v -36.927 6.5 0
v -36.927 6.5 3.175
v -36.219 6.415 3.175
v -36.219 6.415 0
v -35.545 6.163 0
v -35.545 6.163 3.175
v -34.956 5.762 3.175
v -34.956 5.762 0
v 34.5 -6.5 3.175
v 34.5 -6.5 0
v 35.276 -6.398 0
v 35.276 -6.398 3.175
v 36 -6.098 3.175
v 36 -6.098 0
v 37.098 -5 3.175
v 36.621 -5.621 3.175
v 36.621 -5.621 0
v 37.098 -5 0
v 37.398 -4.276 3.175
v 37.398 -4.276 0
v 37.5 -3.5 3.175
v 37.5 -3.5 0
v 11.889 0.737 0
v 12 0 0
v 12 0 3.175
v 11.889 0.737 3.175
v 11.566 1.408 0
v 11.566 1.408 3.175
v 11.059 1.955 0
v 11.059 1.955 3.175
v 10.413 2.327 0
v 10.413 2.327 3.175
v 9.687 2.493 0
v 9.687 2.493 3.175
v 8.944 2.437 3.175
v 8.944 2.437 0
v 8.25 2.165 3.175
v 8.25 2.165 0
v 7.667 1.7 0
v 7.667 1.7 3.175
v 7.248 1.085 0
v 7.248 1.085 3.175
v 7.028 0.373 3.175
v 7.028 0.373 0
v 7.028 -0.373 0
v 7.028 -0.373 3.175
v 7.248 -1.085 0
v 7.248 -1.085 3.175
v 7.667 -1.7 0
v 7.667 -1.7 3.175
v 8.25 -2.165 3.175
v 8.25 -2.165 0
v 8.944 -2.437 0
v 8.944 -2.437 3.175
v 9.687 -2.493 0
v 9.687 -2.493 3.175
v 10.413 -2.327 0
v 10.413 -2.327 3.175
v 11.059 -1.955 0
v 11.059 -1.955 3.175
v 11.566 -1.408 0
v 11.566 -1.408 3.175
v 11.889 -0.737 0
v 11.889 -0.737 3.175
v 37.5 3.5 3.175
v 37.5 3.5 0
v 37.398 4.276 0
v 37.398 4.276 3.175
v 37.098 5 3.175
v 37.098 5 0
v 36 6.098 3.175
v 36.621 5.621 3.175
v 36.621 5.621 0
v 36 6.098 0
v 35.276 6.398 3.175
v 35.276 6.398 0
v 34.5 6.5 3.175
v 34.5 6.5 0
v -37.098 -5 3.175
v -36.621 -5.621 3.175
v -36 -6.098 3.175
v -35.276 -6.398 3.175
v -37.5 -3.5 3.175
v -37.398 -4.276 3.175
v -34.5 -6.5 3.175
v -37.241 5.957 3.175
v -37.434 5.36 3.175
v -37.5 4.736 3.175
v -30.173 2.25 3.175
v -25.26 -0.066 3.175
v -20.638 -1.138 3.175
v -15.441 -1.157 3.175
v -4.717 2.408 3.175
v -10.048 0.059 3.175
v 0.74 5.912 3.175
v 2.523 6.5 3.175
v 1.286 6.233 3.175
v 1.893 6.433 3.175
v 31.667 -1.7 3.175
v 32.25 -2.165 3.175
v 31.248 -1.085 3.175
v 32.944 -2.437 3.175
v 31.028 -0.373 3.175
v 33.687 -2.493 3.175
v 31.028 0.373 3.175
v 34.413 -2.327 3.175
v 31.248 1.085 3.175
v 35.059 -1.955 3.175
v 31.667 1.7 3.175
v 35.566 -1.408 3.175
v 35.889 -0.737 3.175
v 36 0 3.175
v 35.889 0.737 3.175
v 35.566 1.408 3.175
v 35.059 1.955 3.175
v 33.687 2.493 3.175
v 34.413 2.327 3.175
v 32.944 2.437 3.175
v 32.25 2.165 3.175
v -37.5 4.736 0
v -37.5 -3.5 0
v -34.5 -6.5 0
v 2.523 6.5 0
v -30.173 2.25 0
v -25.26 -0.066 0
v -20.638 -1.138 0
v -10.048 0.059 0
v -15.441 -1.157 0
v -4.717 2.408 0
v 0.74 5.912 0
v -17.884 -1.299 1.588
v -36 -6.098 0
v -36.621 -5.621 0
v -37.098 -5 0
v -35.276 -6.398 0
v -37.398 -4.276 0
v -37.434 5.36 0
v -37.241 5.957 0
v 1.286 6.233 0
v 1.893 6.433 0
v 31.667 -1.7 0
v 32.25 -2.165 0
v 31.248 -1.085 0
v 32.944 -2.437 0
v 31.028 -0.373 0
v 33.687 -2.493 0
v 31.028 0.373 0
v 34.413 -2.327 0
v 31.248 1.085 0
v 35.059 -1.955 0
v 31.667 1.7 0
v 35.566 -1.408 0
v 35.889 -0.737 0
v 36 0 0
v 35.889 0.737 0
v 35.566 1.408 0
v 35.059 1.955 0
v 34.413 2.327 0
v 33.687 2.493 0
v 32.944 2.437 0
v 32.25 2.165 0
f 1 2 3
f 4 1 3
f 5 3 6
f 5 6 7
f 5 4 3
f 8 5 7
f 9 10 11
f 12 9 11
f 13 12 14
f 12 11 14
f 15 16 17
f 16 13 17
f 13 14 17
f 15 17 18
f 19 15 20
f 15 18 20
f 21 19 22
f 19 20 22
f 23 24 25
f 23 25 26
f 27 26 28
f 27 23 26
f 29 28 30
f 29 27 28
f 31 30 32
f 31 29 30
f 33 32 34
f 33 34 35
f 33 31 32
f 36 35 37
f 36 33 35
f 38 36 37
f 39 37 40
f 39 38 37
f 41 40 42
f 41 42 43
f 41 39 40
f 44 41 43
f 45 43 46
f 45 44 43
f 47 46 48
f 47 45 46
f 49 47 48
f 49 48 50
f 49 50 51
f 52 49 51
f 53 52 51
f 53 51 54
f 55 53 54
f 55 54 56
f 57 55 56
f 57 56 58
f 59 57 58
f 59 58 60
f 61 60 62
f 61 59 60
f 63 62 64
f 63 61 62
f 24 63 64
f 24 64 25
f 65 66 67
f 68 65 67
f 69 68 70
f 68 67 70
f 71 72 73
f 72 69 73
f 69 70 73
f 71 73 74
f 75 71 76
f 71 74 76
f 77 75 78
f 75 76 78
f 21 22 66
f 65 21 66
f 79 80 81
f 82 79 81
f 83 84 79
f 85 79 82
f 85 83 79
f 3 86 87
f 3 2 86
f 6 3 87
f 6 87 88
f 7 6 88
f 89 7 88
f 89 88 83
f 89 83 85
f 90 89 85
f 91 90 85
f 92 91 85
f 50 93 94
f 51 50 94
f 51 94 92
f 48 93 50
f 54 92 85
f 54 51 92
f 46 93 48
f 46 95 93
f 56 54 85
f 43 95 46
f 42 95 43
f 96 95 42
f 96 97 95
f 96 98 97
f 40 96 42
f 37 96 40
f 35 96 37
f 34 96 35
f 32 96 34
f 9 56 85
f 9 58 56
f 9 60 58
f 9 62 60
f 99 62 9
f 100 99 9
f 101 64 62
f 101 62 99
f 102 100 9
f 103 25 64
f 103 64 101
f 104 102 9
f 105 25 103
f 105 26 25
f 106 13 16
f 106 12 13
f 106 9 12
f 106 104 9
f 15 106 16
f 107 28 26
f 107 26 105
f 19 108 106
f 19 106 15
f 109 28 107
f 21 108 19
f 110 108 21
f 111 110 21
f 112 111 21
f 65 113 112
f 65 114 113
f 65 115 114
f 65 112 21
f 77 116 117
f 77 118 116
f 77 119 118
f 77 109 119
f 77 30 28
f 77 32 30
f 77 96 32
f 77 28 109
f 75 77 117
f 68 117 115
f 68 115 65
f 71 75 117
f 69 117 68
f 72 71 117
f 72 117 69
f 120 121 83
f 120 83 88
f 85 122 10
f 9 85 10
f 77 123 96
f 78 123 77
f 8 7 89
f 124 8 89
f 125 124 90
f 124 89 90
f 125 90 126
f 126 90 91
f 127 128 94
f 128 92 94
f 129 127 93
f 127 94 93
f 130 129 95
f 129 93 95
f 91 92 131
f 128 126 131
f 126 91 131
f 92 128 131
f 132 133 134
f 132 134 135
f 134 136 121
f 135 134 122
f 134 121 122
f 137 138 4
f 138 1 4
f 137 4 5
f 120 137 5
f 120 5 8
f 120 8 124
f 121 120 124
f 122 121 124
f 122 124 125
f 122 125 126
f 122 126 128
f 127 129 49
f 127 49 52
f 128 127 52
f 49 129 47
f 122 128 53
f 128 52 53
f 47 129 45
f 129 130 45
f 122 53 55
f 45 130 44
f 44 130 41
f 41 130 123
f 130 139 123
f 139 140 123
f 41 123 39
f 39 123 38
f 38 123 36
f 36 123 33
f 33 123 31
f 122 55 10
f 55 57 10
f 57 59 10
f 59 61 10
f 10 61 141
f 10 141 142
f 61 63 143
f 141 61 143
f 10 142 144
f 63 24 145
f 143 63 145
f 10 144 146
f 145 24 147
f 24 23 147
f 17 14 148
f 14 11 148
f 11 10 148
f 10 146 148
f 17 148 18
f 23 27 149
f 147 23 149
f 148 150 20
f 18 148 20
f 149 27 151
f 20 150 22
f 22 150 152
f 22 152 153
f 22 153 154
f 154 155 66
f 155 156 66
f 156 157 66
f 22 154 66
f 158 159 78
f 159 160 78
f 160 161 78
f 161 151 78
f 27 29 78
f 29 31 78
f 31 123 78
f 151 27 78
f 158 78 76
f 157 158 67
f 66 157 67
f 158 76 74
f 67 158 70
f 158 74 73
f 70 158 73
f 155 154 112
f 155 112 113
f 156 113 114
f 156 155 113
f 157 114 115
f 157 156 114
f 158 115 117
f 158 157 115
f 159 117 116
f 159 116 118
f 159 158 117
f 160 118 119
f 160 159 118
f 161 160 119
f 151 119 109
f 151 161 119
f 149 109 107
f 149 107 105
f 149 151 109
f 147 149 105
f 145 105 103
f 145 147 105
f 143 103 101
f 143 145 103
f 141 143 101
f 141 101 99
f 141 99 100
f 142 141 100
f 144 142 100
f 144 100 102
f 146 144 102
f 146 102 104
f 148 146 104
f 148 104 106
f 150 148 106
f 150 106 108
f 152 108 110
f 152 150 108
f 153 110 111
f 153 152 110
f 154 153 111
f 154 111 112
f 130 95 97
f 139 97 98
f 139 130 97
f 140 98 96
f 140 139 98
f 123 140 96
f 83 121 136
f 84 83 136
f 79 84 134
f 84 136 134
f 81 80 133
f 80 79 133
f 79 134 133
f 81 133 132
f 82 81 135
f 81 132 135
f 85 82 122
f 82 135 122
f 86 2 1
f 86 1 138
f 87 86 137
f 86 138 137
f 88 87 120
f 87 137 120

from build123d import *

# Parameters (mm, degrees)
SKETCH1_W           = 75
SKETCH1_H           = 13
SKETCH1_R           = 2.5
BOSS_EXTRUDE1_DEPTH = 3.175
CUT_EXTRUDE1_DEPTH  = 3.175
FILLET2_R           = 3
FILLET3_R           = 3


with BuildPart() as part:
    # Sketch1 → Boss-Extrude1 (new body)
    with BuildSketch(Plane.XY):
        Rectangle(SKETCH1_W, SKETCH1_H)
        with Locations((33.5, 0)):
            Circle(SKETCH1_R, mode=Mode.SUBTRACT)
        with Locations((9.5, 0)):
            Circle(SKETCH1_R, mode=Mode.SUBTRACT)
    extrude(amount=BOSS_EXTRUDE1_DEPTH)

    # Sketch3 → Cut-Extrude1 (cut)
    with BuildSketch(Plane.XY.offset(3.175)):
        with BuildLine():
            Line((-35.780363842, 6.5), (1.520225121, 6.5))
            add(Edge.make_bspline(
                [(-35.780363842, 6.5), (-18.824487267, -9.098123968), (1.520225121, 6.5)],
                knots=[0, 0, 0, 1, 1, 1], degree=2))
        make_face()
    extrude(amount=-CUT_EXTRUDE1_DEPTH, mode=Mode.SUBTRACT)

    # Fillet2
    fillet2_edges = [part.edges().sort_by_distance(p)[0] for p in [
        (-35.780363842, 6.5, 1.5875),
        (1.520225121, 6.5, 1.5875),
    ]]
    fillet(fillet2_edges, radius=FILLET2_R)

    # Fillet3
    # the kernel refuses this fillet: 3 mm, written as the material it takes off along each edge
    with BuildSketch(Plane(origin=(37.5, -6.5, -7.5), x_dir=(-1, 0, 0), z_dir=(0, 0, 1)), Plane(origin=(-37.5, -6.5, -7.5), x_dir=(0, 1, 0), z_dir=(0, 0, 1)), Plane(origin=(37.5, 6.5, -7.5), x_dir=(0, -1, 0), z_dir=(0, 0, 1))) as fillet3_piece_1:
        with BuildLine():
            CenterArc((FILLET3_R, -FILLET3_R), FILLET3_R, 90, 90)
            Line((0, -FILLET3_R), (-FILLET3_R * 0.02, -FILLET3_R))
            Line((-FILLET3_R * 0.02, -FILLET3_R), (-FILLET3_R * 0.02, FILLET3_R * 0.02))
            Line((-FILLET3_R * 0.02, FILLET3_R * 0.02), (FILLET3_R, FILLET3_R * 0.02))
            Line((FILLET3_R, FILLET3_R * 0.02), (FILLET3_R, 0))
        make_face()
    extrude(amount=18.175, mode=Mode.SUBTRACT)
    with BuildSketch(Plane(origin=(-37.5, 6.5, -4.409176768), x_dir=(1, 0, 0), z_dir=(0, 0, 1))) as fillet3_piece_2:
        with BuildLine():
            CenterArc((3, -1.763670707), FILLET3_R, 143.992564568, 36.007435432)
            Line((0, -1.763670707), (-0.06, -1.763670707))
            Line((-0.06, -1.763670707), (-0.06, 0))
            Line((-0.06, 0), (0, 0.06))
            ThreePointArc((0, 0.06), (0.286588936, 0.06), (0.52464143, 0.035273414))
            Line((0.52464143, 0.035273414), (0.573177873, 0))
        make_face()
    extrude(amount=11.993353536, mode=Mode.SUBTRACT)


solid = part.part
